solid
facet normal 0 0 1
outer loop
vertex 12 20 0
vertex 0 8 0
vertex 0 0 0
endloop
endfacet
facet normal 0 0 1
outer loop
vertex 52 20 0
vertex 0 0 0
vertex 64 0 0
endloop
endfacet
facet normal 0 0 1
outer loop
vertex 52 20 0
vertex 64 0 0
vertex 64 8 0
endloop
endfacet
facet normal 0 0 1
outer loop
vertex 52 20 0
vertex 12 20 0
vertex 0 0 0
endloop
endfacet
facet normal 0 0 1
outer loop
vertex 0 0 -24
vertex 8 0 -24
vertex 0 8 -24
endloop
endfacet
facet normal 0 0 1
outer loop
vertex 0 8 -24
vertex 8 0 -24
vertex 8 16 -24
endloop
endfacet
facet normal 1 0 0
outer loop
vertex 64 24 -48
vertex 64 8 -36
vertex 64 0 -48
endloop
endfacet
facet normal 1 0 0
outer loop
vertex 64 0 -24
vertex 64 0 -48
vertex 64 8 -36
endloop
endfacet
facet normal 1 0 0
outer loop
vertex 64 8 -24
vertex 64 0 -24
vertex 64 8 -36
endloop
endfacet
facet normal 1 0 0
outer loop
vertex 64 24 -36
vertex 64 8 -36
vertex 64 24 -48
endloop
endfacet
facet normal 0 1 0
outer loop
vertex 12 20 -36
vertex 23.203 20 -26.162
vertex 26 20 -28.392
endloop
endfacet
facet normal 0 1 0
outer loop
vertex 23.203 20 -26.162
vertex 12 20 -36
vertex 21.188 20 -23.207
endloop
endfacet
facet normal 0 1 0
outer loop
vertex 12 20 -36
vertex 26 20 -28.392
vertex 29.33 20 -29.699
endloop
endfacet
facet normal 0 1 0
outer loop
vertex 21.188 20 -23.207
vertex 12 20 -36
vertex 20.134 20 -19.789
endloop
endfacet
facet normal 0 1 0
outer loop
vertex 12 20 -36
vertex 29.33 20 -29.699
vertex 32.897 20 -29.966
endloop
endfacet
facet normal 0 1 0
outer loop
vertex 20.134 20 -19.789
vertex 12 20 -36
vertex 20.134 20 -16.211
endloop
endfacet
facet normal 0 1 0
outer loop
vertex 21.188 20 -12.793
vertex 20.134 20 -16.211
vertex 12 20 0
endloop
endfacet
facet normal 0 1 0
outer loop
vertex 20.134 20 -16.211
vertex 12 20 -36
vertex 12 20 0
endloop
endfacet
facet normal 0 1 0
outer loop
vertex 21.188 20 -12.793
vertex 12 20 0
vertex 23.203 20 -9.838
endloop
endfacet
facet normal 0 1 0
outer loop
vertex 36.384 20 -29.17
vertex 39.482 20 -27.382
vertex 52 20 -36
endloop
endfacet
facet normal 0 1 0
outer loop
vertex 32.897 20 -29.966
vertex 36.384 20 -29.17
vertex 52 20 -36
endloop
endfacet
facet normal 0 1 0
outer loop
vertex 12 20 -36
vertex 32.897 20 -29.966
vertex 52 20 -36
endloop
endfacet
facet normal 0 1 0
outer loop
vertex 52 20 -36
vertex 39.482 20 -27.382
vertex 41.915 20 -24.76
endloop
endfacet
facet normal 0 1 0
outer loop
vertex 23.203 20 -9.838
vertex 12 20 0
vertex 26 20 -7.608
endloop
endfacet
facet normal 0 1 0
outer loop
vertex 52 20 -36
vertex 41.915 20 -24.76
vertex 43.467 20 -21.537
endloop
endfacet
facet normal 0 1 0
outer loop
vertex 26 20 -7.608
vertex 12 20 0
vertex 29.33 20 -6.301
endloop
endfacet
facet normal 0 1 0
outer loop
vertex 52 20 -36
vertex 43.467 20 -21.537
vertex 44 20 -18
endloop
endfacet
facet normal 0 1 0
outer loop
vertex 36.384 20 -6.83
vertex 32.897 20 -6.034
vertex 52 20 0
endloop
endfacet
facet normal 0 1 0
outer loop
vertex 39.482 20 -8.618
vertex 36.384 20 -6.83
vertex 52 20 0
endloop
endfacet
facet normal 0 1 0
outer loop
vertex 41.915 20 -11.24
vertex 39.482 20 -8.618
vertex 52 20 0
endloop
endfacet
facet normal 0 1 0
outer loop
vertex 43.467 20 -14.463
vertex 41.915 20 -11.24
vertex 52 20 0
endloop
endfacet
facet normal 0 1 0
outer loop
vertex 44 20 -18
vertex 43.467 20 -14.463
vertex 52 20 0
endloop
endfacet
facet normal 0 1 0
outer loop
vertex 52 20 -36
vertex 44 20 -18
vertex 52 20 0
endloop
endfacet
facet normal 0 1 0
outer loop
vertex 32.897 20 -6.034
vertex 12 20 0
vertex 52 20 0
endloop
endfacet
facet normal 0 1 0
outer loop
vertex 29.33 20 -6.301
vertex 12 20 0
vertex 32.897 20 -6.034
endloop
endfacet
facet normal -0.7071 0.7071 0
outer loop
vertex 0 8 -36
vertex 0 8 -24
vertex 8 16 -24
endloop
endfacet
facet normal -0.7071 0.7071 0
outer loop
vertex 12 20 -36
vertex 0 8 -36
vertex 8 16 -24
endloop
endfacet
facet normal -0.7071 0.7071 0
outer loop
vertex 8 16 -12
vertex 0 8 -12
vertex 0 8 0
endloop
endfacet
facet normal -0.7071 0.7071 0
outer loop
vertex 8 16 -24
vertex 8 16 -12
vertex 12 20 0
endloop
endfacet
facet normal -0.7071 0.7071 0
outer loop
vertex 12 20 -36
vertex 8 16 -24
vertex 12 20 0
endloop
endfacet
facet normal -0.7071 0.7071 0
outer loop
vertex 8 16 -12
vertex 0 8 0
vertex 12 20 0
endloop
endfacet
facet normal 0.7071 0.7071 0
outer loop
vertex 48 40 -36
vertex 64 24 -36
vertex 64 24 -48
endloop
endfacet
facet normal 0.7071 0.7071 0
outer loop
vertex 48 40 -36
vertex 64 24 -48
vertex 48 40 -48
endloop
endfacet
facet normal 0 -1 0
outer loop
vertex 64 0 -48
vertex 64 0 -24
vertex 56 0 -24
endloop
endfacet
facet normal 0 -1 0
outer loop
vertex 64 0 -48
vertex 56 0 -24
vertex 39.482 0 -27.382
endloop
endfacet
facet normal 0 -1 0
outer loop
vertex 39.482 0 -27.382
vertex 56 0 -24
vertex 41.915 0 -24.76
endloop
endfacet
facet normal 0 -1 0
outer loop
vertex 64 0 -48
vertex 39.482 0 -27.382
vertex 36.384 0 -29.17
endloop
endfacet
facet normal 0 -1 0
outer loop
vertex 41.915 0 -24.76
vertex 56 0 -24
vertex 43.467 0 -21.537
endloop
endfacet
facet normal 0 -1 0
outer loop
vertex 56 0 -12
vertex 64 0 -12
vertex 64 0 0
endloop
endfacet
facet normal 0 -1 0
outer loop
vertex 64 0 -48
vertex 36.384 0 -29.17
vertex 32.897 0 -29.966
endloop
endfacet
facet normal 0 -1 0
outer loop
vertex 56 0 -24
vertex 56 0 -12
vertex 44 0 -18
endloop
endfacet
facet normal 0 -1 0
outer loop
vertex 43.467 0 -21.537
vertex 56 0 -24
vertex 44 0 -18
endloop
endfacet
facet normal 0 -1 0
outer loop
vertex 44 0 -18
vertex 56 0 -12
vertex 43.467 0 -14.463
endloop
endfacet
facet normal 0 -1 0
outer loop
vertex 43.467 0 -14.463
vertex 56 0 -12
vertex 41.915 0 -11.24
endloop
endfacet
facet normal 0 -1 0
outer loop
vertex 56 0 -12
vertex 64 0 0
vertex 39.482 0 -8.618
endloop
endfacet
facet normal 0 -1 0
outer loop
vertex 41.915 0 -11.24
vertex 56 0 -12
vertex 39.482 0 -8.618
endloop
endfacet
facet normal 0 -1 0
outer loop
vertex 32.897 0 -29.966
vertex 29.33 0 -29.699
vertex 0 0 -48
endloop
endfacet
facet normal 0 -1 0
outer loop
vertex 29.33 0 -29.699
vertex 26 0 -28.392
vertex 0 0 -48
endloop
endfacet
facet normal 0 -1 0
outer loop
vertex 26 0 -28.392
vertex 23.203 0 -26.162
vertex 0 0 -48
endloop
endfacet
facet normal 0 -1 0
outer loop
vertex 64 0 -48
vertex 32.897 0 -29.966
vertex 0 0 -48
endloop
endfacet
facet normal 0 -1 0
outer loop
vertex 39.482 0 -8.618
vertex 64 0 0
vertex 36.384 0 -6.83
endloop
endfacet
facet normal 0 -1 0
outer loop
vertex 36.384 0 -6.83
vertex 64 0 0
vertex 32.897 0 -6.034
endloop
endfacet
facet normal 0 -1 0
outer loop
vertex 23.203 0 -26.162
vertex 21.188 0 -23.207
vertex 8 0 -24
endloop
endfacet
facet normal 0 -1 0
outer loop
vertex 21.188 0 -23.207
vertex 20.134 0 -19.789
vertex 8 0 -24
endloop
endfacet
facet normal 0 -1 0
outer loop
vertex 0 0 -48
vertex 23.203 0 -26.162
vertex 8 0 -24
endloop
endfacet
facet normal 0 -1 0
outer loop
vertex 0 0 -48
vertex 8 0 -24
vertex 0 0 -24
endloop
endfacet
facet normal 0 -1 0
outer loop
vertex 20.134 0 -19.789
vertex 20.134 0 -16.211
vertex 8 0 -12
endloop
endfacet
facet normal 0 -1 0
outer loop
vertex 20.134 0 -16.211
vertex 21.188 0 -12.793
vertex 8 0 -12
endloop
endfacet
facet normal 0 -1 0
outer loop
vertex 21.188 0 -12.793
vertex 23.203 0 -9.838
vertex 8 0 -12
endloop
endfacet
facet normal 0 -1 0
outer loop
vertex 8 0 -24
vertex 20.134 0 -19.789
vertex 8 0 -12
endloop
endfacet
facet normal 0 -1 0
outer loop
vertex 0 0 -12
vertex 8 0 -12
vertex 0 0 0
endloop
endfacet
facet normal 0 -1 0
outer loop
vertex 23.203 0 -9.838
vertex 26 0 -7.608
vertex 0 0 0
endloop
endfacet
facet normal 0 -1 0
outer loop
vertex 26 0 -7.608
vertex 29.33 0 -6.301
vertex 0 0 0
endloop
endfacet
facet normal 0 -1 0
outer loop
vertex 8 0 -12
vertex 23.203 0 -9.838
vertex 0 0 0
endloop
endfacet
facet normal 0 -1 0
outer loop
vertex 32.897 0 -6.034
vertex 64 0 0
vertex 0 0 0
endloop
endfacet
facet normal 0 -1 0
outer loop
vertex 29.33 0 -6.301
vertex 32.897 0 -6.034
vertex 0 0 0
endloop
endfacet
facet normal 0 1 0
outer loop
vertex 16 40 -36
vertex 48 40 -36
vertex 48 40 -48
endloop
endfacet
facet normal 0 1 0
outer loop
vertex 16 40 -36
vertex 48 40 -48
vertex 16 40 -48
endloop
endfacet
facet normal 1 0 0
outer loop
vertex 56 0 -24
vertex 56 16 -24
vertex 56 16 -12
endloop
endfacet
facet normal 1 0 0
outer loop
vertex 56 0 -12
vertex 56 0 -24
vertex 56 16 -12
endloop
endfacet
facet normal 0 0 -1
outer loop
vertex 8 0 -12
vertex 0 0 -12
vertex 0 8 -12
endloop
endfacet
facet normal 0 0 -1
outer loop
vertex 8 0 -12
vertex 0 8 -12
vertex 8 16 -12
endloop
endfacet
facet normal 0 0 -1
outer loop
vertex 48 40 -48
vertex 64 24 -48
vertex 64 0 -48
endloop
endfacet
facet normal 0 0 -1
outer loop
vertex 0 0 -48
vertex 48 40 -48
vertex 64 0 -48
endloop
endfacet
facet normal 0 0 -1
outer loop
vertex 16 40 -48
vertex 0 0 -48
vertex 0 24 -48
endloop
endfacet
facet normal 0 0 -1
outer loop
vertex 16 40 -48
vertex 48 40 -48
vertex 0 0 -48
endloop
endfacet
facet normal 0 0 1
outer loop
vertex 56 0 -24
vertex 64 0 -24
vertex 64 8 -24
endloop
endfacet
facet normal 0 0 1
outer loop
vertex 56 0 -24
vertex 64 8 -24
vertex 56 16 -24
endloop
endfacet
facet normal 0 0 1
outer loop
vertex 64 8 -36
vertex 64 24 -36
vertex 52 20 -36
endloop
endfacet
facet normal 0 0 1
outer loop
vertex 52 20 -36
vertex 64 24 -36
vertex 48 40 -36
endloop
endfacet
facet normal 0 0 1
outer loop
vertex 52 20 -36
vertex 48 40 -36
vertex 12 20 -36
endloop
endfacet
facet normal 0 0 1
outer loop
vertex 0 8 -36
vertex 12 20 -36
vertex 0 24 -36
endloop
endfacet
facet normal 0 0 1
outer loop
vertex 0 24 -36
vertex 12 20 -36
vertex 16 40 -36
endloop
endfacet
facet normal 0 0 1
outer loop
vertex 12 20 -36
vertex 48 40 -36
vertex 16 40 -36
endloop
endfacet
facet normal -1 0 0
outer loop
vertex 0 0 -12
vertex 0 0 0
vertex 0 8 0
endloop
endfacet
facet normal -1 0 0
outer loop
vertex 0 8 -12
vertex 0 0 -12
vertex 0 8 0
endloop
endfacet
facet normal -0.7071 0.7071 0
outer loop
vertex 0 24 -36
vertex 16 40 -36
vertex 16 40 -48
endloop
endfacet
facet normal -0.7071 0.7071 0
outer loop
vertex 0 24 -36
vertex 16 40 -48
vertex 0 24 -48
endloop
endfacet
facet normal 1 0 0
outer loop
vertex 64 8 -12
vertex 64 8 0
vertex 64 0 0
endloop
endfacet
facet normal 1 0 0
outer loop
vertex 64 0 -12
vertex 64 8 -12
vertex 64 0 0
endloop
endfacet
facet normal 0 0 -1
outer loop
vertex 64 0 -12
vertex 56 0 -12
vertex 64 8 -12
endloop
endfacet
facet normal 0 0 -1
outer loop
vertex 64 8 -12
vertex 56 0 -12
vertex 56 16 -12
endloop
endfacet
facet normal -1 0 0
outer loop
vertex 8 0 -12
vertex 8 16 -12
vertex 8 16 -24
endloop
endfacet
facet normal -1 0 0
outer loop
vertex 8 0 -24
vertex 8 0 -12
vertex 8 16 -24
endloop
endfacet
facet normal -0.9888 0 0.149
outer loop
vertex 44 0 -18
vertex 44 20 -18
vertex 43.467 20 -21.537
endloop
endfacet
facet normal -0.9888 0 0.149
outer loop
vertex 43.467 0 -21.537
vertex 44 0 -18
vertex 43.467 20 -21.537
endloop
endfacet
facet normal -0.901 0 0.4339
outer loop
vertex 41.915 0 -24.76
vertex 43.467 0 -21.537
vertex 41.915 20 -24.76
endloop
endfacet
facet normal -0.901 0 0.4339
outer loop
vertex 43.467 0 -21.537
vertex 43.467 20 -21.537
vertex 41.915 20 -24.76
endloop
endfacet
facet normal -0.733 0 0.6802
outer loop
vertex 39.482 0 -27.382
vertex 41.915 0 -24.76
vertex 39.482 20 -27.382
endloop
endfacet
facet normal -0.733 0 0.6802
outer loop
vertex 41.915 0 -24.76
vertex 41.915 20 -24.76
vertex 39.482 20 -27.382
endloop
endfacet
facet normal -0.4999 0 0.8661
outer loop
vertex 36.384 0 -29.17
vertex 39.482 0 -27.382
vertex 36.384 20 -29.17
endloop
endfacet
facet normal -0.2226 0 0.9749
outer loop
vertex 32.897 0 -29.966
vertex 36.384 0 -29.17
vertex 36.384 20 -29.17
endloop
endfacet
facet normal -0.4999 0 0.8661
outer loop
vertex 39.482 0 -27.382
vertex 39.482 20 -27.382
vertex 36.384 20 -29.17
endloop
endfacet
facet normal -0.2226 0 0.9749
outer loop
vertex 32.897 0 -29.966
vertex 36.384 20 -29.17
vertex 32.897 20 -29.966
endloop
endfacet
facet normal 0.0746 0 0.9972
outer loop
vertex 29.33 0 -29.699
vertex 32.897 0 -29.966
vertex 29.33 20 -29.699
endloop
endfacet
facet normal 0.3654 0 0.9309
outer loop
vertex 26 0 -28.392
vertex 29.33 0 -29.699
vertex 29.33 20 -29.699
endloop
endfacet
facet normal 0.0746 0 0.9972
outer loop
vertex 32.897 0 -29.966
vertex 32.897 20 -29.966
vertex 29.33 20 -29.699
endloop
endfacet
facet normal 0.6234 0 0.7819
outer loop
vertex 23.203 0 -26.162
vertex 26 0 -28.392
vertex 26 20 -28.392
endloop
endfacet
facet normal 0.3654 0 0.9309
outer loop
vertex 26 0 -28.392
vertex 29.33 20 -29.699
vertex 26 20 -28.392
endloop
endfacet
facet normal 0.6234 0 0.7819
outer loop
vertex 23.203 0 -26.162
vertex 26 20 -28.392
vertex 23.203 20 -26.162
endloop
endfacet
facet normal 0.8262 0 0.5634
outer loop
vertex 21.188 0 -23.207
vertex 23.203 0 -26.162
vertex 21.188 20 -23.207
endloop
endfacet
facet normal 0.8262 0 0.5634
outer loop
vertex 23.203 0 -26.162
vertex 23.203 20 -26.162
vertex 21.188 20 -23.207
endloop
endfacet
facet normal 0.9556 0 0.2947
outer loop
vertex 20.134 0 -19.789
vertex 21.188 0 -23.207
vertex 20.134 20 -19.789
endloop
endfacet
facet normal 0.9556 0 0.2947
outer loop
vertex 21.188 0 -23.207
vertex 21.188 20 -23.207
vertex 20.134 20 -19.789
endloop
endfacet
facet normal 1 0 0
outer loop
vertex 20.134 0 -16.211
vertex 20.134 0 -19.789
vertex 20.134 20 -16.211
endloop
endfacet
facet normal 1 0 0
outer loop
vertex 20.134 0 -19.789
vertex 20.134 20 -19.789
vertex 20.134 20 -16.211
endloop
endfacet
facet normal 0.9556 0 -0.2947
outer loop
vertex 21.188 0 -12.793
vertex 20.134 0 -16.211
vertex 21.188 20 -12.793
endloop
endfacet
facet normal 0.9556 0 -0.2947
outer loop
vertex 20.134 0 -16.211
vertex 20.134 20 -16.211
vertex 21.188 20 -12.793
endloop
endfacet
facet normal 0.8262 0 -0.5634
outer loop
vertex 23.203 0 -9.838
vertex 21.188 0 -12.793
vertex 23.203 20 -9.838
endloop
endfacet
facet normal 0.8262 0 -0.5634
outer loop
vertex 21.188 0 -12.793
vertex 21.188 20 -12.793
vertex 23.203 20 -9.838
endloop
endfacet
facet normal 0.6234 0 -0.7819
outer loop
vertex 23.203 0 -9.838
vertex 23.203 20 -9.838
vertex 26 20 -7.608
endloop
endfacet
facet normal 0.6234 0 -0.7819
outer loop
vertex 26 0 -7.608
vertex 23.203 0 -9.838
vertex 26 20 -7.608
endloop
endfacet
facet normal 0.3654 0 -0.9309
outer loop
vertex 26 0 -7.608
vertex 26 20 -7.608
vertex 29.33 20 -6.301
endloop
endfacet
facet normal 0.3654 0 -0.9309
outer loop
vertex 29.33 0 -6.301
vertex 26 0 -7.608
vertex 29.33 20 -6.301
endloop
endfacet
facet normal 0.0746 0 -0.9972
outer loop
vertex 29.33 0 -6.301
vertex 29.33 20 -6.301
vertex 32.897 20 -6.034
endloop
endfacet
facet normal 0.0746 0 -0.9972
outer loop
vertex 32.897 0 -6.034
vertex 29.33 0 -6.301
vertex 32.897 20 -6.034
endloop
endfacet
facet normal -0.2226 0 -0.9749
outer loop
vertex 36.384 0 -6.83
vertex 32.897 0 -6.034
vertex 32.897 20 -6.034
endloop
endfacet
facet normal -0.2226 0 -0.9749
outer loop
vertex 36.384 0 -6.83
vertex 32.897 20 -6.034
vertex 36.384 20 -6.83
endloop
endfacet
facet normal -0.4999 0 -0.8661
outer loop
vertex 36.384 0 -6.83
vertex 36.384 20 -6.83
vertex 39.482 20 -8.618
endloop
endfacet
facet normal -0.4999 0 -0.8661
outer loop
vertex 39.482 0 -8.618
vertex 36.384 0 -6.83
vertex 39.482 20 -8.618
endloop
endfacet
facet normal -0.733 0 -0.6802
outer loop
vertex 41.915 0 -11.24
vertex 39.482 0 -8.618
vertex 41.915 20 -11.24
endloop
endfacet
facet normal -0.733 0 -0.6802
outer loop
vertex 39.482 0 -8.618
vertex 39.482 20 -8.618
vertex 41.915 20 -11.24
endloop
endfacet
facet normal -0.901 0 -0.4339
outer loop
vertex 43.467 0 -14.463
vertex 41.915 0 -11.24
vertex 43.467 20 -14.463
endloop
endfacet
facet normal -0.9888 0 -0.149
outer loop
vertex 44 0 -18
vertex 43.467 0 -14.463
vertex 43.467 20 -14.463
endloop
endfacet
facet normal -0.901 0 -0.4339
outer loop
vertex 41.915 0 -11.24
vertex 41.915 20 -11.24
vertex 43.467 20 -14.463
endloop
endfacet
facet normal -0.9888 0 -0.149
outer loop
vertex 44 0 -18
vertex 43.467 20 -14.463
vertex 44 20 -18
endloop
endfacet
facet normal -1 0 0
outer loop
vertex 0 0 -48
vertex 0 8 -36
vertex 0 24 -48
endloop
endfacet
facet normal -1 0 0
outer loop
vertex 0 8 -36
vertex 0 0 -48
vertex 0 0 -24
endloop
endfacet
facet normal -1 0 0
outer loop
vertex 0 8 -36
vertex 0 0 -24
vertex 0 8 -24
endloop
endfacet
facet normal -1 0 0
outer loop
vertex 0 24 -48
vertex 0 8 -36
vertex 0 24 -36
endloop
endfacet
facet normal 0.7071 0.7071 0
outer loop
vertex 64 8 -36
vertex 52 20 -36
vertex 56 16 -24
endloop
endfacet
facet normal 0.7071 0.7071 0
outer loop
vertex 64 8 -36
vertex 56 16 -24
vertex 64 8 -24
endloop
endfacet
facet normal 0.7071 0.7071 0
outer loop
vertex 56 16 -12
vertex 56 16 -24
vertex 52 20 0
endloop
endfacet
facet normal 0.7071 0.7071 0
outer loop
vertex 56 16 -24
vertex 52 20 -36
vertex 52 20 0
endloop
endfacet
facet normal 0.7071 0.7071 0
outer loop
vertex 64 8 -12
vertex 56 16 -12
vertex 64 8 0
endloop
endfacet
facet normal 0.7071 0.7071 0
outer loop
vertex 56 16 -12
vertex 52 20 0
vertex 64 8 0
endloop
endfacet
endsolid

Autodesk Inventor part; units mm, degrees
ref_plane "YZ Plane" through (0, 0, 0) normal (1, 0, 0) x (0, 1, 0)
ref_plane "XZ Plane" through (0, 0, 0) normal (0, 1, 0) x (-1, 0, 0)
ref_plane "XY Plane" through (0, 0, 0) normal (0, 0, 1) x (1, 0, 0)
sketch "草圖1" plane through (0, 0, 0) normal (0, 0, 1) x (1, 0, 0)
  line L0 (0, 0) -> (0, 8)
  line L1 (0, 8) -> (12, 20)
  line L2 (12, 20) -> (52, 20)
  line L3 (52, 20) -> (64, 8)
  line L4 (64, 8) -> (64, 0)
  line L5 (64, 0) -> (0, 0)
  dimension "d0" = 8
  dimension "d1" = 8
  dimension "d2" = 40
  dimension "d3" = 64
  dimension "d4" = 20
  dimension "d5" = 12
extrude "擠出1" add sketch "草圖1" against normal blind 36
sketch "草圖3" plane through (12, 20, 0) normal (0, 1, 0) x (1, 0, 0)
  line L0 (52, 0) -> (52, 36) projected
  line L1 (52, 24) -> (44, 24)
  line L2 (44, 24) -> (44, 12)
  line L3 (44, 12) -> (52, 12)
  line L4 (40, 0) -> (52, 0) projected
  point P0 (-12, 0)
  dimension "d10" = 12
  dimension "d11" = 12
  dimension "d12" = 8
extrude "擠出2" cut sketch "草圖3" against normal blind 48
sketch "草圖5" plane through (12, 20, 0) normal (0, 1, 0) x (1, 0, 0)
  line L0 (-12, 0) -> (-12, 36) projected
  line L1 (-12, 12) -> (-4, 12)
  line L2 (-4, 12) -> (-4, 24)
  line L3 (-4, 24) -> (-12, 24)
  line L4 (-12, 0) -> (0, 0) projected
  dimension "d18" = 12
  dimension "d19" = 12
  dimension "d20" = 8
extrude "擠出3" cut sketch "草圖5" against normal blind 48
sketch "草圖6" plane through (12, 20, 0) normal (0, 1, 0) x (1, 0, 0)
  circle A0 centre (20, 18) radius 12
  line L0 (0, 0) -> (40, 0) projected
  line L1 (40, 0) -> (40, 36) projected
  point P0 (-12, 0)
  dimension "d23" = 24
  dimension "d24" = 18
  dimension "d25" = 20
extrude "擠出4" cut sketch "草圖6" against normal blind 48
sketch "草圖7" plane through (0, 0, -36) normal (0, 0, -1) x (-1, 0, 0)
  line L0 (-64, 0) -> (-64, 24)
  line L1 (-64, 24) -> (-48, 40)
  line L2 (-48, 40) -> (-16, 40)
  line L3 (-16, 40) -> (0, 24)
  line L4 (0, 0) -> (0, 8) projected
  line L5 (0, 24) -> (0, 8)
  line L6 (0, 8) -> (0, 0)
  line L7 (-64, 0) -> (0, 0) projected
  dimension "d28" = 32
  dimension "d29" = 16
  dimension "d30" = 40
  dimension "d31" = 16
  dimension "d32" = 16
extrude "擠出5" add sketch "草圖7" along normal blind 12
properties part number "410571040加分題"
